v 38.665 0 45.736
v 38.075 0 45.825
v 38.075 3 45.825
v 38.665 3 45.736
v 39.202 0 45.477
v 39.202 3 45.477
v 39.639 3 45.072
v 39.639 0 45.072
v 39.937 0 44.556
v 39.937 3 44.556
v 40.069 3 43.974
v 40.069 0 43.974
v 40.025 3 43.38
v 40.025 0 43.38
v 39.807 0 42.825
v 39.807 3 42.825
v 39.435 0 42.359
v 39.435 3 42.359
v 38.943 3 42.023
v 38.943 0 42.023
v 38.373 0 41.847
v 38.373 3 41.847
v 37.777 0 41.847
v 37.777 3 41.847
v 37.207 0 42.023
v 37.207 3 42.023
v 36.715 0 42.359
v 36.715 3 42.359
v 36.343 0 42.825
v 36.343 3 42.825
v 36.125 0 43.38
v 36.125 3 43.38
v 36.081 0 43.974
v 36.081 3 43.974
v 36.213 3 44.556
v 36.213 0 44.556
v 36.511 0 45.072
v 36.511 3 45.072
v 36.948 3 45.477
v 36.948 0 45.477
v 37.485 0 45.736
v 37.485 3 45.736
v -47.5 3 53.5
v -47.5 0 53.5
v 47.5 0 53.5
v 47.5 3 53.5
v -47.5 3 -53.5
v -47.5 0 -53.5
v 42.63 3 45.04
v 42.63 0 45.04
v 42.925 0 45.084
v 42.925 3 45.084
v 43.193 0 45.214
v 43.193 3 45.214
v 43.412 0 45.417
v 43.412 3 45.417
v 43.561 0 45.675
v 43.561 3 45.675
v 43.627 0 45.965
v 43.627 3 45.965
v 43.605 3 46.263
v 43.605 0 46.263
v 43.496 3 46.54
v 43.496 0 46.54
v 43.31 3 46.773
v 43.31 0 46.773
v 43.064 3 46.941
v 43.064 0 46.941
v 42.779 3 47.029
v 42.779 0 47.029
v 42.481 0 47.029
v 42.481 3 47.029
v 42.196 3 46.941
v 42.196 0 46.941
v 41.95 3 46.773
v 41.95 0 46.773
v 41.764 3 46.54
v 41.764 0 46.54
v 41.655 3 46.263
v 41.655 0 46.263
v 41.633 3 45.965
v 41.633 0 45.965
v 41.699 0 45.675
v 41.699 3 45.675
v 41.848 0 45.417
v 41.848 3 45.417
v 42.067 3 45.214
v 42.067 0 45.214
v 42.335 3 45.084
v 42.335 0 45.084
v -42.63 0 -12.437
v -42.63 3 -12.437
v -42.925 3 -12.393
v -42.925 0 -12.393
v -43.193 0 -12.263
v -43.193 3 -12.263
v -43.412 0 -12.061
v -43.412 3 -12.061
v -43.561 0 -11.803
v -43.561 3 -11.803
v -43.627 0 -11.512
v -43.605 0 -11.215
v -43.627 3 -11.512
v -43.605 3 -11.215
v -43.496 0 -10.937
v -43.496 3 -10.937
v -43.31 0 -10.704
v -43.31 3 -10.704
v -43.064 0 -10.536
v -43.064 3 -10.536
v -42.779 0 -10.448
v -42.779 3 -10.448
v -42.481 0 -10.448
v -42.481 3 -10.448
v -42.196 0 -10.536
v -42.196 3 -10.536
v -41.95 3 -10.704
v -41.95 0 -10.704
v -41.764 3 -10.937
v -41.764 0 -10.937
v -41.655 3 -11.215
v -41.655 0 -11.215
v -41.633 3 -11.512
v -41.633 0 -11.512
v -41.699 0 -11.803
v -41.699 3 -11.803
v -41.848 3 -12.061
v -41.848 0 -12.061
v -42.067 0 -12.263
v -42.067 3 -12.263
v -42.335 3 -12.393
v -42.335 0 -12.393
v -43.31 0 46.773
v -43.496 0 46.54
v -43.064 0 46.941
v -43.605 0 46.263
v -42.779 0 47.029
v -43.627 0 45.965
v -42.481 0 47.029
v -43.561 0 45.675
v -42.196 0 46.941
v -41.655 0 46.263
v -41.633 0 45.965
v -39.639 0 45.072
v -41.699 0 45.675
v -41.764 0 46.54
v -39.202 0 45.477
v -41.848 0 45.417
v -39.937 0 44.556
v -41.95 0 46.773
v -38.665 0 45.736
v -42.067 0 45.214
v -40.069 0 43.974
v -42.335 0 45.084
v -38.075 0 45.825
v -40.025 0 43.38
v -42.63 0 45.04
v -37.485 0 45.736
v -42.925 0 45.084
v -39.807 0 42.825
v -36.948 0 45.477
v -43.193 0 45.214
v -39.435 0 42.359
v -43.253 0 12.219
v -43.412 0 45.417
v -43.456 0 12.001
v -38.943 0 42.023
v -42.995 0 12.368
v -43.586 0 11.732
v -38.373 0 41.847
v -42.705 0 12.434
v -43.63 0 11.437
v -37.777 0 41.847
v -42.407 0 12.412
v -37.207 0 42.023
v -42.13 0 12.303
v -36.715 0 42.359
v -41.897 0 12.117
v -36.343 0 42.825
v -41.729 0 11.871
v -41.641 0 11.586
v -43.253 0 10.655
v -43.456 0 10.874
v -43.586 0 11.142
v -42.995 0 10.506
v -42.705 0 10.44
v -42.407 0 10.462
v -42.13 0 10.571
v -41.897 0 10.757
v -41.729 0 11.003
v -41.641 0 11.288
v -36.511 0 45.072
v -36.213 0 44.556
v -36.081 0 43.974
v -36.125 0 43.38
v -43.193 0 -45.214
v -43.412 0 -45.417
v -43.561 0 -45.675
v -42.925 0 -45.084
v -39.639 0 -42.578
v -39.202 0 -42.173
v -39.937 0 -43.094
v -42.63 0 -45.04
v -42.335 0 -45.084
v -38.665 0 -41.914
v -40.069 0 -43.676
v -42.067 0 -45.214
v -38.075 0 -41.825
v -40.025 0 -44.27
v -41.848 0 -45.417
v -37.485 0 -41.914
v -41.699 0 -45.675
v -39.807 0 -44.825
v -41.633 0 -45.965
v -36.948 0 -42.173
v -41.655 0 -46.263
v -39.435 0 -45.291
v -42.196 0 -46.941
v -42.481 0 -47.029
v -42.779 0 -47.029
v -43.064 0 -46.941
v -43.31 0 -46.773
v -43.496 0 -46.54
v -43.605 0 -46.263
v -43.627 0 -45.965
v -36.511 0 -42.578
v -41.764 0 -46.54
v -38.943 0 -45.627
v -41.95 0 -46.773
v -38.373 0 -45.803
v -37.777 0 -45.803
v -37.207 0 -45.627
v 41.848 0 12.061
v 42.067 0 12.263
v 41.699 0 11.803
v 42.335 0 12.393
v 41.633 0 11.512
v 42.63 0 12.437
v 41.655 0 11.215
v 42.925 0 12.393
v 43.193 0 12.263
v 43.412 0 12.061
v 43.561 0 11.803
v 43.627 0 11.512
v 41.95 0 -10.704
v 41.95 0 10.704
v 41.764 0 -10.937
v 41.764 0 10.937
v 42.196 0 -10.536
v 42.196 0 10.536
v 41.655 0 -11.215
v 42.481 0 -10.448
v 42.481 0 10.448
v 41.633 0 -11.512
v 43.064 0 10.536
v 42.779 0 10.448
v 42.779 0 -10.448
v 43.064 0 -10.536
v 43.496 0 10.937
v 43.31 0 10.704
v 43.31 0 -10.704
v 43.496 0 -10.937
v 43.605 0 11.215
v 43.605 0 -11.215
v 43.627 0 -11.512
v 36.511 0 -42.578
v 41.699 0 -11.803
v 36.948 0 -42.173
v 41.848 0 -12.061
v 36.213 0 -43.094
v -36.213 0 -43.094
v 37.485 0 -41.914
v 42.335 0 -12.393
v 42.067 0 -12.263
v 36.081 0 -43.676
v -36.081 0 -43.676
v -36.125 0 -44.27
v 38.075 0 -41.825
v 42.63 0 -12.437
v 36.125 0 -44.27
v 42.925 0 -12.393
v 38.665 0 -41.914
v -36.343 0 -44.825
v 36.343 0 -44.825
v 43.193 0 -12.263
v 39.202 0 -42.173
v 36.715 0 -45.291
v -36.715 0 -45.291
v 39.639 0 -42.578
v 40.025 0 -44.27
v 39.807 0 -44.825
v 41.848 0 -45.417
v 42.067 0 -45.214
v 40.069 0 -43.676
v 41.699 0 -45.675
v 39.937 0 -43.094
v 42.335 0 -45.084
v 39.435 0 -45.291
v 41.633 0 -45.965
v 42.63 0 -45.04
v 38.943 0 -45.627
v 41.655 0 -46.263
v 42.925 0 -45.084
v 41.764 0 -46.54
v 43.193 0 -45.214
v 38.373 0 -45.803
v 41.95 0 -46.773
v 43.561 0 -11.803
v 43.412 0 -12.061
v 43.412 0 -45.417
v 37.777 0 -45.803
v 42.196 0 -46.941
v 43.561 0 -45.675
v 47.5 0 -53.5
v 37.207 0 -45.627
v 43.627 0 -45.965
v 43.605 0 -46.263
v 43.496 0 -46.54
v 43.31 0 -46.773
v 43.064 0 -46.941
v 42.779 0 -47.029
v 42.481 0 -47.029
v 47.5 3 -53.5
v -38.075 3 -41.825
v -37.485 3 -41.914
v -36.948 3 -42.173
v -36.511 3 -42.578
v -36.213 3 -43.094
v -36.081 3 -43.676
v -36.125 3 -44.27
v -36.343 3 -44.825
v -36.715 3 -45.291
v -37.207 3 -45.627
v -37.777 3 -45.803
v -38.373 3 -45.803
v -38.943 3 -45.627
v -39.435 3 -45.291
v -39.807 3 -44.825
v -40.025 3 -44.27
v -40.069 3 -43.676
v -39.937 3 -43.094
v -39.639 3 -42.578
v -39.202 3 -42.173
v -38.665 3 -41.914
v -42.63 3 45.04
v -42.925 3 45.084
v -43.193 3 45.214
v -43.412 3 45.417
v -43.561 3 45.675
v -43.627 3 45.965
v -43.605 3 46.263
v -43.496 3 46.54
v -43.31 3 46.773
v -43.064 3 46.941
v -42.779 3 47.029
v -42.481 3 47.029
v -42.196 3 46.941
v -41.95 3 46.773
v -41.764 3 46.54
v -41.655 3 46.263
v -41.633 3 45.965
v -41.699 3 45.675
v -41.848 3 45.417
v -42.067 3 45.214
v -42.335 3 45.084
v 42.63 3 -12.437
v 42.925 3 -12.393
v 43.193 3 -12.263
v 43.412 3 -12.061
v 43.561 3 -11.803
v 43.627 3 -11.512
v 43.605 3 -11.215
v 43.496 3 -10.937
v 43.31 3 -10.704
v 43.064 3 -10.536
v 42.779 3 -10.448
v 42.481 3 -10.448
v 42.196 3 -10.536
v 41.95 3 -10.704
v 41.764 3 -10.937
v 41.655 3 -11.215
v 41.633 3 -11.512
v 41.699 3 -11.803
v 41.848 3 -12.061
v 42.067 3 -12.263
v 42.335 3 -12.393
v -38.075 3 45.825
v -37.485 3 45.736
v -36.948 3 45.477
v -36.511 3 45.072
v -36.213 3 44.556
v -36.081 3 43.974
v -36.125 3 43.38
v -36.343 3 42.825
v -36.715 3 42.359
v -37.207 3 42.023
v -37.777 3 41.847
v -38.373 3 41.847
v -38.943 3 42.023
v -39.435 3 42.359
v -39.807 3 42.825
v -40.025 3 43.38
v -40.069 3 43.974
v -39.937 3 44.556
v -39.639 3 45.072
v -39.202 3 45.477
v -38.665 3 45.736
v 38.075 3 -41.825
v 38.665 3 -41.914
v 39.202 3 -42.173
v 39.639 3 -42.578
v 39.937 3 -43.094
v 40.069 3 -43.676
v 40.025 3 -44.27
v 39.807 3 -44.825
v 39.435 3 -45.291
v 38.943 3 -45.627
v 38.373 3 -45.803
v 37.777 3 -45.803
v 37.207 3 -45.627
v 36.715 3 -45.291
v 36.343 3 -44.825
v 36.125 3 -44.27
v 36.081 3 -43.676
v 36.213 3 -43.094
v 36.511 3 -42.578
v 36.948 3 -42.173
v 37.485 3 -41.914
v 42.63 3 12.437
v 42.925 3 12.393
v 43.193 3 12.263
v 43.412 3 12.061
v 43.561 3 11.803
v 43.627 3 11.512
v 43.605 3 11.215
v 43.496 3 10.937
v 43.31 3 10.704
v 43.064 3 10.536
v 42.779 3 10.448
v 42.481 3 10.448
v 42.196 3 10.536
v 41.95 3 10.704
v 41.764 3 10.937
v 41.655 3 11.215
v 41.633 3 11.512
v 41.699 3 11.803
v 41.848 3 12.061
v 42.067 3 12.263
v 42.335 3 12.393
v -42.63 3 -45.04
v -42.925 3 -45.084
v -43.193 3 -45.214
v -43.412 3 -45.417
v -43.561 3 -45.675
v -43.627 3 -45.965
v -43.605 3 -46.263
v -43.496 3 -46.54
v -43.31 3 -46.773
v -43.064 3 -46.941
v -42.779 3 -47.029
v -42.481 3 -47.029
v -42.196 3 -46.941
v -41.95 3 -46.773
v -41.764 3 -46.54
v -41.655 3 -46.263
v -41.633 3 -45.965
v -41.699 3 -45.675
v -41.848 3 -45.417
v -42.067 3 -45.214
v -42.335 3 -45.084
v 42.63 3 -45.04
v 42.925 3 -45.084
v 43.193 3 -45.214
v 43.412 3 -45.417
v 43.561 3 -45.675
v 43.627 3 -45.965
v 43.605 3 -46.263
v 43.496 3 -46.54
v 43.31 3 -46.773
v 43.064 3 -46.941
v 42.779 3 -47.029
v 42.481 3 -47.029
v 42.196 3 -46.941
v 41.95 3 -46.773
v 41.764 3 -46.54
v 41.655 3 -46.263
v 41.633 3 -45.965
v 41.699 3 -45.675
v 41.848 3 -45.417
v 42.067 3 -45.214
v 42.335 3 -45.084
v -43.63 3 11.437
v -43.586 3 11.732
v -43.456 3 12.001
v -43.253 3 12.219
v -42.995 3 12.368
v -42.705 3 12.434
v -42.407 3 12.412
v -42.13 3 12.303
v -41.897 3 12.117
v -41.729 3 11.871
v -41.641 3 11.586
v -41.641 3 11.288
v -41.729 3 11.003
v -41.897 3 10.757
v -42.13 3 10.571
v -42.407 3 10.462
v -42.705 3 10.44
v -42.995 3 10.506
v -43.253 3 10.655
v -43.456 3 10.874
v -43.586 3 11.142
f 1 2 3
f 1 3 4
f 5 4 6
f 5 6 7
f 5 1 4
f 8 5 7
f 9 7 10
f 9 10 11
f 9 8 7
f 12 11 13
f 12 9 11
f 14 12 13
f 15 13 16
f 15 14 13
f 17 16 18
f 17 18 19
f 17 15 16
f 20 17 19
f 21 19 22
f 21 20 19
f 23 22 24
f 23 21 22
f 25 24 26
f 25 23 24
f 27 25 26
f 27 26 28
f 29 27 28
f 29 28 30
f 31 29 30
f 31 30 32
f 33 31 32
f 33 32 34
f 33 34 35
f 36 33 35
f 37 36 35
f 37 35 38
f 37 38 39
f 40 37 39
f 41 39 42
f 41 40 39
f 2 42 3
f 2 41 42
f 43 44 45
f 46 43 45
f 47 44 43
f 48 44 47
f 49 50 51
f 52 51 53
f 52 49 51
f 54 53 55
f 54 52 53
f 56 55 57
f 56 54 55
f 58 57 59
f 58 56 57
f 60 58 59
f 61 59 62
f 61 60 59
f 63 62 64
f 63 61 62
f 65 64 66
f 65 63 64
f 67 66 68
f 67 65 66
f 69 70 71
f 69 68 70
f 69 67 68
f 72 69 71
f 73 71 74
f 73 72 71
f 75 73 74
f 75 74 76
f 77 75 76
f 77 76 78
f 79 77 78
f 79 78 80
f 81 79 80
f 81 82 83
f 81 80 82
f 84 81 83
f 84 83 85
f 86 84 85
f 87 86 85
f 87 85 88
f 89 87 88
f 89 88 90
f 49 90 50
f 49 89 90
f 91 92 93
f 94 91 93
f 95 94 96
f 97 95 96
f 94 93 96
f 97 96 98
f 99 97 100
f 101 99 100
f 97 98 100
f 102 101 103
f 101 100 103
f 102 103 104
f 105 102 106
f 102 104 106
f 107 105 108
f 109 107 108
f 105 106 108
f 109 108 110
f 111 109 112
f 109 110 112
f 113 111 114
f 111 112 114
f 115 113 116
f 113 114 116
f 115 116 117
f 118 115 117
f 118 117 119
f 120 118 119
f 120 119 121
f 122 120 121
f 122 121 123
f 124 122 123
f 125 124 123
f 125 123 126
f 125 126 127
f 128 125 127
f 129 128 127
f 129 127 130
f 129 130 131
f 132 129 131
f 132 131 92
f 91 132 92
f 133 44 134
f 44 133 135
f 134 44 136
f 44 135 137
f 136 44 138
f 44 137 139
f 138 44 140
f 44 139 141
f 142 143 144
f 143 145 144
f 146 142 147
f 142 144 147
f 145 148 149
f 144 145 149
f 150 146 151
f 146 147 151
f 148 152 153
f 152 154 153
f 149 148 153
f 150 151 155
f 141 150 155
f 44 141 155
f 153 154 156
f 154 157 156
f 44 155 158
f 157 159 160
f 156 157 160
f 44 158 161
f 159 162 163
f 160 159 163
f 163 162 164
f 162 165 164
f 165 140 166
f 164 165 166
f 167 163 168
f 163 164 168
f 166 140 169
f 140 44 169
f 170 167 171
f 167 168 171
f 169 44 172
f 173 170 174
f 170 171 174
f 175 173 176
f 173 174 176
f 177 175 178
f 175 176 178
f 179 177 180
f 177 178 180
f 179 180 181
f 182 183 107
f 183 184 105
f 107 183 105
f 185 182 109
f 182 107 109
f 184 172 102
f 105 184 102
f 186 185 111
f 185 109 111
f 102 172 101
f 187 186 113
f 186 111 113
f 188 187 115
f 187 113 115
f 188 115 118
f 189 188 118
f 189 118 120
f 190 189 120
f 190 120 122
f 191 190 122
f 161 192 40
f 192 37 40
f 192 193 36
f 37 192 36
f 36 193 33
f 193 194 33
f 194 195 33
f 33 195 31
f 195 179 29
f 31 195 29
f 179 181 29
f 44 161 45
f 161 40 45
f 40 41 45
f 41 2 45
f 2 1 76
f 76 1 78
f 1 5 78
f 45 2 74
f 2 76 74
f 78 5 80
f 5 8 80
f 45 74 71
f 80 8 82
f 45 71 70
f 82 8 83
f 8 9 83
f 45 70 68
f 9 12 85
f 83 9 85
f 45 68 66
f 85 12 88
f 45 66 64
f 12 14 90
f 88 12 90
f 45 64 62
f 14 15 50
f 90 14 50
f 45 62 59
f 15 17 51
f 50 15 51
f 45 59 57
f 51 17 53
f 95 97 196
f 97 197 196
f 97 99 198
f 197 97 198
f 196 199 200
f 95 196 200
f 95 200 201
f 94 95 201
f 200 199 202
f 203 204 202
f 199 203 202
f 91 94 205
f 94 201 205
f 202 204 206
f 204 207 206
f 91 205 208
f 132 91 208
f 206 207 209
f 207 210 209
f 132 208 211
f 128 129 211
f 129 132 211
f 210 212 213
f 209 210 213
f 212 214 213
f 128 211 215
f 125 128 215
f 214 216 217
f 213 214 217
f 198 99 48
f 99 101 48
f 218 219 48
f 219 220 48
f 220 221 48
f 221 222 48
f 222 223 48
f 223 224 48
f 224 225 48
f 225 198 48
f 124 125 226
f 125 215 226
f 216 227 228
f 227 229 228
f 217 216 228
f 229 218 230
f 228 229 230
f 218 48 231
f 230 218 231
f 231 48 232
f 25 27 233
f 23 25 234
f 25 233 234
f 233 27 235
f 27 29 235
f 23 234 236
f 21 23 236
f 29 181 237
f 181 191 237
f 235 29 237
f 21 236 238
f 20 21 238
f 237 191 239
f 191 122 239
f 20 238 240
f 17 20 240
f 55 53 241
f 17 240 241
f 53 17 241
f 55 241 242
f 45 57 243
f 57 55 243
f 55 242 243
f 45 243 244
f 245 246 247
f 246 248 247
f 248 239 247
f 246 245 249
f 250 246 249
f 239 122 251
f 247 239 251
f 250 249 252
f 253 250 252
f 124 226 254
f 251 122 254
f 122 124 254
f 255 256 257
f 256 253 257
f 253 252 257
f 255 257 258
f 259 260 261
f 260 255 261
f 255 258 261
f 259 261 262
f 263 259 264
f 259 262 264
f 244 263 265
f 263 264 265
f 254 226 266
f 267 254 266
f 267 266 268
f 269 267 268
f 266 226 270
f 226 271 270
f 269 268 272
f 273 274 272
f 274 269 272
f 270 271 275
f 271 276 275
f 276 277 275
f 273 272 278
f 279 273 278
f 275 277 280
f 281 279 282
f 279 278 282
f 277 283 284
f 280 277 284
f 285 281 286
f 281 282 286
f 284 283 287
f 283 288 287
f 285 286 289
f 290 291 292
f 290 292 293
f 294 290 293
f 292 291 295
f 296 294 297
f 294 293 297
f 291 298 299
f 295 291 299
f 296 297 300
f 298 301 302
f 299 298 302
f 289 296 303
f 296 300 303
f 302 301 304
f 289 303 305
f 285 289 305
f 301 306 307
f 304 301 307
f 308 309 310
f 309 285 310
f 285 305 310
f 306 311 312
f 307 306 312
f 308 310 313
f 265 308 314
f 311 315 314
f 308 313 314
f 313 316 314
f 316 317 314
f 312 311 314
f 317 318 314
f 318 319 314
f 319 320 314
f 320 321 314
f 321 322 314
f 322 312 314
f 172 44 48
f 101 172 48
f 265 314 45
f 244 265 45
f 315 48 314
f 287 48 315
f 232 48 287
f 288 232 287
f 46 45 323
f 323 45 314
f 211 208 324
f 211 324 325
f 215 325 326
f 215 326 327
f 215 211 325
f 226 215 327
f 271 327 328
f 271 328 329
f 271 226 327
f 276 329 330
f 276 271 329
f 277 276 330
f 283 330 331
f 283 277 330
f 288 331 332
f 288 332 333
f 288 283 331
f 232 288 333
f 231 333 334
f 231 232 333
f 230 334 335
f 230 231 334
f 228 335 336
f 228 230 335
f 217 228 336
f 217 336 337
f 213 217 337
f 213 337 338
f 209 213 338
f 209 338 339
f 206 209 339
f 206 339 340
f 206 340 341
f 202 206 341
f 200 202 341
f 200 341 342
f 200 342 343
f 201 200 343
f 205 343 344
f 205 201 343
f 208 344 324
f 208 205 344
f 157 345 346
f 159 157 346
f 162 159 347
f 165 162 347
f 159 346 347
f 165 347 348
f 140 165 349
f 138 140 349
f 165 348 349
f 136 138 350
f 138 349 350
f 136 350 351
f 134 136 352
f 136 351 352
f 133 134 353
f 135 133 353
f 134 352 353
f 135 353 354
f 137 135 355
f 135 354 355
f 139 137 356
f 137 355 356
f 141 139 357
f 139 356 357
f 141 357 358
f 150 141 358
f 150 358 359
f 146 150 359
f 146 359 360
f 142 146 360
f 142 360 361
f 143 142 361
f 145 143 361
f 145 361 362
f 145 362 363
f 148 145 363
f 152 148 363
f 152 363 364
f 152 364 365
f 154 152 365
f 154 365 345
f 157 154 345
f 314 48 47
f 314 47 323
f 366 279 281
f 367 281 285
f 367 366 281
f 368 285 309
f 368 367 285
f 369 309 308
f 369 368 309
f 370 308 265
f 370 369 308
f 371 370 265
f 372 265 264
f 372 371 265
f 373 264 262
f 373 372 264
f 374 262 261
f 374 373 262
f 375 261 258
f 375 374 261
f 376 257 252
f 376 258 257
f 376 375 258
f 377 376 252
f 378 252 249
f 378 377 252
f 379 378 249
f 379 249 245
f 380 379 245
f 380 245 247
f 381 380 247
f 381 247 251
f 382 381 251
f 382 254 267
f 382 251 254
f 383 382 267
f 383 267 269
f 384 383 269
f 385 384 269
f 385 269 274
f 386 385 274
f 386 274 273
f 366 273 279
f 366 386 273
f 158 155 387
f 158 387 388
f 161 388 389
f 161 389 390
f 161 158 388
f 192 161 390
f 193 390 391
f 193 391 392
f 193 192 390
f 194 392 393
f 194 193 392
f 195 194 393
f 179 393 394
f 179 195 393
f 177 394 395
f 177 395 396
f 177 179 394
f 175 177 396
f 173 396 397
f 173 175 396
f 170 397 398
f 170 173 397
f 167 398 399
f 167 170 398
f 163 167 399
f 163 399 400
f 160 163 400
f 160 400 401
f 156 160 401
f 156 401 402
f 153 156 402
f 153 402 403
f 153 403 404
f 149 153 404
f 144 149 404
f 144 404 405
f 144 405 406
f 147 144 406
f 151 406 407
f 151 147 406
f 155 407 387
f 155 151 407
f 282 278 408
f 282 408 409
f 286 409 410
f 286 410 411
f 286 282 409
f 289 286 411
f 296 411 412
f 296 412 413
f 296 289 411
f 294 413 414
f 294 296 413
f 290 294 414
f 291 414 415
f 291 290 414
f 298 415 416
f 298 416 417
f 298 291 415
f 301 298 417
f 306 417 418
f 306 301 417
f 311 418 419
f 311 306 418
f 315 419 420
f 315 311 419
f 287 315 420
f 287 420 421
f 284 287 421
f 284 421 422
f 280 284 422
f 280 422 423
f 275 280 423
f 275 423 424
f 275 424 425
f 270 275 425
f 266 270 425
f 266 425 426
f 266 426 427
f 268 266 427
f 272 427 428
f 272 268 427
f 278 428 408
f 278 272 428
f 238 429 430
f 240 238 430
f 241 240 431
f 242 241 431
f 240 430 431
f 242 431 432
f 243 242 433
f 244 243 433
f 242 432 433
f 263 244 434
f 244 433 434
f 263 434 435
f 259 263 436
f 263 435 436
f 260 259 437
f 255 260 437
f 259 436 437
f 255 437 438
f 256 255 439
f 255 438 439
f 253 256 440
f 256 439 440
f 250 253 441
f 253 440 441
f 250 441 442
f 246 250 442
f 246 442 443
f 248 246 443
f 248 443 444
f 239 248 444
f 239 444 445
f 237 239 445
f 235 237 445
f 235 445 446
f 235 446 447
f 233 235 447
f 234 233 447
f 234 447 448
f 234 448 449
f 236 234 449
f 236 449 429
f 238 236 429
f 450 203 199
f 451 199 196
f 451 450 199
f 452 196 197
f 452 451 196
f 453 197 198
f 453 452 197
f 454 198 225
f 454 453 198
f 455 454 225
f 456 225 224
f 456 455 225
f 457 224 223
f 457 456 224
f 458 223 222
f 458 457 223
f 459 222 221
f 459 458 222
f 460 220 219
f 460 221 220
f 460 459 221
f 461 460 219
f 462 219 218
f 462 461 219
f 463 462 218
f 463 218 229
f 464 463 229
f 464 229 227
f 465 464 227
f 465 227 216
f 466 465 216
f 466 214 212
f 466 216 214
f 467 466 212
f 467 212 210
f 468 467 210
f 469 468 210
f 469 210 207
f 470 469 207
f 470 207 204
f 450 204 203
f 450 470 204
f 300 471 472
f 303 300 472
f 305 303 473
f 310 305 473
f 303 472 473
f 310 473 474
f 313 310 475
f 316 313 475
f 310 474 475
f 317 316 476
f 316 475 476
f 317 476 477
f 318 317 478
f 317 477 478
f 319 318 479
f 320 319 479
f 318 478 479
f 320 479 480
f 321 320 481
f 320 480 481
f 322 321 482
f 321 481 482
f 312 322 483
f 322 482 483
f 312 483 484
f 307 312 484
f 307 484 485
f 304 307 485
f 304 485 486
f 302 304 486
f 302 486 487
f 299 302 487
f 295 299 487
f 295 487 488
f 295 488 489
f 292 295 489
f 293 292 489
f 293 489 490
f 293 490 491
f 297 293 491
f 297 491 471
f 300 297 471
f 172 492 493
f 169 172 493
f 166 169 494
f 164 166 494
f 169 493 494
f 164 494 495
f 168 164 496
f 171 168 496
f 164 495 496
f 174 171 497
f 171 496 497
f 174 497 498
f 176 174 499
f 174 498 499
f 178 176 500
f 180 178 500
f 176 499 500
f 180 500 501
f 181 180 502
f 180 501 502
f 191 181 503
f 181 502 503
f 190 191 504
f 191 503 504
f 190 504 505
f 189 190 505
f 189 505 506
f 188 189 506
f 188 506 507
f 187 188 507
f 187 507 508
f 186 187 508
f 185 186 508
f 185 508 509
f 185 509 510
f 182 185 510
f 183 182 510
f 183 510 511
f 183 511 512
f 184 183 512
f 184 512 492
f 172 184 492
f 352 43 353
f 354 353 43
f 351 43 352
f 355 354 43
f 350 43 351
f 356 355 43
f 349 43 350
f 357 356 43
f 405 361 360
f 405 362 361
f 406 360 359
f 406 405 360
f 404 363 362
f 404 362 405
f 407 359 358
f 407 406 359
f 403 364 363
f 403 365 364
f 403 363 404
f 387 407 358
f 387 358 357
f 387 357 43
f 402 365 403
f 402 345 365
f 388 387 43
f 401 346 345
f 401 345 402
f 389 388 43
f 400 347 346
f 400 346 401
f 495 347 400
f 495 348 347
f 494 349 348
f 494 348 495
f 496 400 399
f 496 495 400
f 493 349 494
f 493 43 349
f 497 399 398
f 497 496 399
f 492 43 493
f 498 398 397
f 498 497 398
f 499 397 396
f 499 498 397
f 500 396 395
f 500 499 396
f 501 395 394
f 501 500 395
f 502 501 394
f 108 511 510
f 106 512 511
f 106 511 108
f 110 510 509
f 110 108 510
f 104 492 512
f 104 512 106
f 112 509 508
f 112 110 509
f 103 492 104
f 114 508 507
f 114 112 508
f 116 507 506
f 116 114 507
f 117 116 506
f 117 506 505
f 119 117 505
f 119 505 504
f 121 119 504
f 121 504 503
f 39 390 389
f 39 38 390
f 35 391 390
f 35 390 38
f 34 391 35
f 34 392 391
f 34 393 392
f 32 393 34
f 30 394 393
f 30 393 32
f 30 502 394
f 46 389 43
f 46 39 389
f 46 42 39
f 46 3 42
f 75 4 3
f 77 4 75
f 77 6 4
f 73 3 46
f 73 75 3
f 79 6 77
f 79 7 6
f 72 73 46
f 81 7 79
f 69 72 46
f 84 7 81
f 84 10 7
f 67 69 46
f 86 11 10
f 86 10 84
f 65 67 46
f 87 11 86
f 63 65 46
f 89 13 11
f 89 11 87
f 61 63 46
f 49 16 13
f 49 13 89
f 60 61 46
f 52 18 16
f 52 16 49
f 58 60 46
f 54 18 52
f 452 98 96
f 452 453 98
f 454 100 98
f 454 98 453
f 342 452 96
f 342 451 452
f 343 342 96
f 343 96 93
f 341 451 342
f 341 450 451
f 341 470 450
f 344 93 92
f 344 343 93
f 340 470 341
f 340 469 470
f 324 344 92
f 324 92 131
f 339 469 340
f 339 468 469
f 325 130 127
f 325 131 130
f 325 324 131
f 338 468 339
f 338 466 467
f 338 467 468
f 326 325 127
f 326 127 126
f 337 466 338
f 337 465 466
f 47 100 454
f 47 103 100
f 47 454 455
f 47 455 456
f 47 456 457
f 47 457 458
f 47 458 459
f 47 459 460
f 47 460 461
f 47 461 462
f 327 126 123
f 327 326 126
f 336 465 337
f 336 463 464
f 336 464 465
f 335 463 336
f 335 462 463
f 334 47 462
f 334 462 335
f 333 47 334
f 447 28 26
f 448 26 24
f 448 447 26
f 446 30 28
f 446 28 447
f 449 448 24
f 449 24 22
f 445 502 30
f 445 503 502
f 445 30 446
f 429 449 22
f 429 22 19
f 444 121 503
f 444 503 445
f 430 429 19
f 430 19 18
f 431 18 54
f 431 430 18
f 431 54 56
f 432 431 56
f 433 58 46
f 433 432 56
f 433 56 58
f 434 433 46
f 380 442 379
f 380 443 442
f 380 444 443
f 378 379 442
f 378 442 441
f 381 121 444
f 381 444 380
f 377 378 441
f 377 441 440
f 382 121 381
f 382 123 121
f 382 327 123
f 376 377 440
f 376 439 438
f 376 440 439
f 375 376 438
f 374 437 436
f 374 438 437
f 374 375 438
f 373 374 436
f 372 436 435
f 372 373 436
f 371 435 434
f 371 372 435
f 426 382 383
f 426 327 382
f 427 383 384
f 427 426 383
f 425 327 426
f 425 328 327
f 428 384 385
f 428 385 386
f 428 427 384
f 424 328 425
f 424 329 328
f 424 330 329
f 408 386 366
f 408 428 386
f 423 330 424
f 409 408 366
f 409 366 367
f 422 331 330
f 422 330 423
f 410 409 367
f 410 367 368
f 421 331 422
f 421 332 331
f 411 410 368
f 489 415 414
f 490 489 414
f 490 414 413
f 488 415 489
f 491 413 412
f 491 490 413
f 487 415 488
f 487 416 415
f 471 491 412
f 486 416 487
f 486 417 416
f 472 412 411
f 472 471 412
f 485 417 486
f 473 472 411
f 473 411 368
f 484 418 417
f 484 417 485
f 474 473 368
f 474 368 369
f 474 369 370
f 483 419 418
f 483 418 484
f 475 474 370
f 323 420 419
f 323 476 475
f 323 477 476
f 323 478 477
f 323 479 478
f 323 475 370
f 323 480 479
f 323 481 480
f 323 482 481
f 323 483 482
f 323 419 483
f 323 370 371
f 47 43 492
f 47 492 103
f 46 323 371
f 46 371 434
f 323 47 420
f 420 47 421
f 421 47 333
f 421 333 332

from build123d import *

# Parameters (mm, degrees)
SKETCH2_W                                  = 95
SKETCH2_H                                  = 107
SKETCH2_R                                  = 2
BOSS_EXTRUDE1_DEPTH                        = 3
SKETCH7_R                                  = 1
CUT_EXTRUDE2_DEPTH                         = 10
MIRROR3_COPY_1_SKETCH_R                    = 1
MIRROR3_COPY_1_DEPTH                       = 10
MIRROR3_AT_THE_SECOND_PLANE_COPY_1_SKETC_R = 1
MIRROR3_AT_THE_SECOND_PLANE_COPY_1_DEPTH   = 10
MIRROR3_AT_THE_SECOND_PLANE_COPY_2_SKETC_R = 1
MIRROR3_AT_THE_SECOND_PLANE_COPY_2_DEPTH   = 10
MIRROR3_AT_THE_SECOND_PLANE_COPY_3_SKETC_R = 1
MIRROR3_AT_THE_SECOND_PLANE_COPY_3_DEPTH   = 10


with BuildPart() as part:
    # Sketch2 → Boss-Extrude1 (new body)
    with BuildSketch(Plane(origin=(0, 0, 0), x_dir=(1, 0, 0), z_dir=(0, 1, 0))):
        Rectangle(SKETCH2_W, SKETCH2_H)
        with Locations(Location((38.075, -43.825, 0), (0, 0, 270))):
            Circle(SKETCH2_R, mode=Mode.SUBTRACT)
        with Locations(Location((38.075, 43.825, 0), (0, 0, 270))):
            Circle(SKETCH2_R, mode=Mode.SUBTRACT)
        with Locations(Location((-38.075, -43.825, 0), (0, 0, 270))):
            Circle(SKETCH2_R, mode=Mode.SUBTRACT)
        with Locations(Location((-38.075, 43.825, 0), (0, 0, 270))):
            Circle(SKETCH2_R, mode=Mode.SUBTRACT)
    extrude(amount=BOSS_EXTRUDE1_DEPTH)

    # Sketch7 → Cut-Extrude2 (cut)
    with BuildSketch(Plane(origin=(0, 3, 0), x_dir=(1, 0, 0), z_dir=(0, 1, 0))):
        with Locations(Location((42.63, 46.04, 0), (0, 0, 270))):
            Circle(SKETCH7_R)
    cut_extrude2 = extrude(amount=-CUT_EXTRUDE2_DEPTH, mode=Mode.SUBTRACT)

    # Mirror2: Cut-Extrude2 across plane
    add(cut_extrude2.mirror(Plane(origin=(0, 0, -28.738611276), x_dir=(1, 0, 0), z_dir=(0, 0, -1))), mode=Mode.SUBTRACT)

    # Mirror3: Cut-Extrude2 across plane
    add(cut_extrude2.mirror(Plane(origin=(0, 0, 0), x_dir=(0, 0, 1), z_dir=(1, 0, 0))), mode=Mode.SUBTRACT)

    # Mirror3 copy 1 sketch → Mirror3 copy 1 (cut)
    with BuildSketch(Plane(origin=(0, 3, -57.477222552), x_dir=(-1, 0, 0), z_dir=(0, 1, 0))):
        with Locations(Location((42.63, 46.04, 0), (0, 0, 270))):
            Circle(MIRROR3_COPY_1_SKETCH_R)
    extrude(amount=-MIRROR3_COPY_1_DEPTH, mode=Mode.SUBTRACT)

    # Mirror3 at the second plane: Cut-Extrude2 across plane
    add(cut_extrude2.mirror(Plane.XY), mode=Mode.SUBTRACT)

    # Mirror3 at the second plane copy 1 sketc → Mirror3 at the second plane copy 1 (cut)
    with BuildSketch(Plane(origin=(0, 3, 57.477222552), x_dir=(1, 0, 0), z_dir=(0, 1, 0))):
        with Locations(Location((42.63, 46.04, 0), (0, 0, 270))):
            Circle(MIRROR3_AT_THE_SECOND_PLANE_COPY_1_SKETC_R)
    extrude(amount=-MIRROR3_AT_THE_SECOND_PLANE_COPY_1_DEPTH, mode=Mode.SUBTRACT)

    # Mirror3 at the second plane copy 2 sketc → Mirror3 at the second plane copy 2 (cut)
    with BuildSketch(Plane(origin=(0, 3, 0), x_dir=(-1, 0, 0), z_dir=(0, 1, 0))):
        with Locations(Location((42.63, 46.04, 0), (0, 0, 270))):
            Circle(MIRROR3_AT_THE_SECOND_PLANE_COPY_2_SKETC_R)
    extrude(amount=-MIRROR3_AT_THE_SECOND_PLANE_COPY_2_DEPTH, mode=Mode.SUBTRACT)

    # Mirror3 at the second plane copy 3 sketc → Mirror3 at the second plane copy 3 (cut)
    with BuildSketch(Plane(origin=(0, 3, 57.477222552), x_dir=(-1, 0, 0), z_dir=(0, 1, 0))):
        with Locations((42.63, -46.04)):
            Circle(MIRROR3_AT_THE_SECOND_PLANE_COPY_3_SKETC_R)
    extrude(amount=-MIRROR3_AT_THE_SECOND_PLANE_COPY_3_DEPTH, mode=Mode.SUBTRACT)


solid = part.part
